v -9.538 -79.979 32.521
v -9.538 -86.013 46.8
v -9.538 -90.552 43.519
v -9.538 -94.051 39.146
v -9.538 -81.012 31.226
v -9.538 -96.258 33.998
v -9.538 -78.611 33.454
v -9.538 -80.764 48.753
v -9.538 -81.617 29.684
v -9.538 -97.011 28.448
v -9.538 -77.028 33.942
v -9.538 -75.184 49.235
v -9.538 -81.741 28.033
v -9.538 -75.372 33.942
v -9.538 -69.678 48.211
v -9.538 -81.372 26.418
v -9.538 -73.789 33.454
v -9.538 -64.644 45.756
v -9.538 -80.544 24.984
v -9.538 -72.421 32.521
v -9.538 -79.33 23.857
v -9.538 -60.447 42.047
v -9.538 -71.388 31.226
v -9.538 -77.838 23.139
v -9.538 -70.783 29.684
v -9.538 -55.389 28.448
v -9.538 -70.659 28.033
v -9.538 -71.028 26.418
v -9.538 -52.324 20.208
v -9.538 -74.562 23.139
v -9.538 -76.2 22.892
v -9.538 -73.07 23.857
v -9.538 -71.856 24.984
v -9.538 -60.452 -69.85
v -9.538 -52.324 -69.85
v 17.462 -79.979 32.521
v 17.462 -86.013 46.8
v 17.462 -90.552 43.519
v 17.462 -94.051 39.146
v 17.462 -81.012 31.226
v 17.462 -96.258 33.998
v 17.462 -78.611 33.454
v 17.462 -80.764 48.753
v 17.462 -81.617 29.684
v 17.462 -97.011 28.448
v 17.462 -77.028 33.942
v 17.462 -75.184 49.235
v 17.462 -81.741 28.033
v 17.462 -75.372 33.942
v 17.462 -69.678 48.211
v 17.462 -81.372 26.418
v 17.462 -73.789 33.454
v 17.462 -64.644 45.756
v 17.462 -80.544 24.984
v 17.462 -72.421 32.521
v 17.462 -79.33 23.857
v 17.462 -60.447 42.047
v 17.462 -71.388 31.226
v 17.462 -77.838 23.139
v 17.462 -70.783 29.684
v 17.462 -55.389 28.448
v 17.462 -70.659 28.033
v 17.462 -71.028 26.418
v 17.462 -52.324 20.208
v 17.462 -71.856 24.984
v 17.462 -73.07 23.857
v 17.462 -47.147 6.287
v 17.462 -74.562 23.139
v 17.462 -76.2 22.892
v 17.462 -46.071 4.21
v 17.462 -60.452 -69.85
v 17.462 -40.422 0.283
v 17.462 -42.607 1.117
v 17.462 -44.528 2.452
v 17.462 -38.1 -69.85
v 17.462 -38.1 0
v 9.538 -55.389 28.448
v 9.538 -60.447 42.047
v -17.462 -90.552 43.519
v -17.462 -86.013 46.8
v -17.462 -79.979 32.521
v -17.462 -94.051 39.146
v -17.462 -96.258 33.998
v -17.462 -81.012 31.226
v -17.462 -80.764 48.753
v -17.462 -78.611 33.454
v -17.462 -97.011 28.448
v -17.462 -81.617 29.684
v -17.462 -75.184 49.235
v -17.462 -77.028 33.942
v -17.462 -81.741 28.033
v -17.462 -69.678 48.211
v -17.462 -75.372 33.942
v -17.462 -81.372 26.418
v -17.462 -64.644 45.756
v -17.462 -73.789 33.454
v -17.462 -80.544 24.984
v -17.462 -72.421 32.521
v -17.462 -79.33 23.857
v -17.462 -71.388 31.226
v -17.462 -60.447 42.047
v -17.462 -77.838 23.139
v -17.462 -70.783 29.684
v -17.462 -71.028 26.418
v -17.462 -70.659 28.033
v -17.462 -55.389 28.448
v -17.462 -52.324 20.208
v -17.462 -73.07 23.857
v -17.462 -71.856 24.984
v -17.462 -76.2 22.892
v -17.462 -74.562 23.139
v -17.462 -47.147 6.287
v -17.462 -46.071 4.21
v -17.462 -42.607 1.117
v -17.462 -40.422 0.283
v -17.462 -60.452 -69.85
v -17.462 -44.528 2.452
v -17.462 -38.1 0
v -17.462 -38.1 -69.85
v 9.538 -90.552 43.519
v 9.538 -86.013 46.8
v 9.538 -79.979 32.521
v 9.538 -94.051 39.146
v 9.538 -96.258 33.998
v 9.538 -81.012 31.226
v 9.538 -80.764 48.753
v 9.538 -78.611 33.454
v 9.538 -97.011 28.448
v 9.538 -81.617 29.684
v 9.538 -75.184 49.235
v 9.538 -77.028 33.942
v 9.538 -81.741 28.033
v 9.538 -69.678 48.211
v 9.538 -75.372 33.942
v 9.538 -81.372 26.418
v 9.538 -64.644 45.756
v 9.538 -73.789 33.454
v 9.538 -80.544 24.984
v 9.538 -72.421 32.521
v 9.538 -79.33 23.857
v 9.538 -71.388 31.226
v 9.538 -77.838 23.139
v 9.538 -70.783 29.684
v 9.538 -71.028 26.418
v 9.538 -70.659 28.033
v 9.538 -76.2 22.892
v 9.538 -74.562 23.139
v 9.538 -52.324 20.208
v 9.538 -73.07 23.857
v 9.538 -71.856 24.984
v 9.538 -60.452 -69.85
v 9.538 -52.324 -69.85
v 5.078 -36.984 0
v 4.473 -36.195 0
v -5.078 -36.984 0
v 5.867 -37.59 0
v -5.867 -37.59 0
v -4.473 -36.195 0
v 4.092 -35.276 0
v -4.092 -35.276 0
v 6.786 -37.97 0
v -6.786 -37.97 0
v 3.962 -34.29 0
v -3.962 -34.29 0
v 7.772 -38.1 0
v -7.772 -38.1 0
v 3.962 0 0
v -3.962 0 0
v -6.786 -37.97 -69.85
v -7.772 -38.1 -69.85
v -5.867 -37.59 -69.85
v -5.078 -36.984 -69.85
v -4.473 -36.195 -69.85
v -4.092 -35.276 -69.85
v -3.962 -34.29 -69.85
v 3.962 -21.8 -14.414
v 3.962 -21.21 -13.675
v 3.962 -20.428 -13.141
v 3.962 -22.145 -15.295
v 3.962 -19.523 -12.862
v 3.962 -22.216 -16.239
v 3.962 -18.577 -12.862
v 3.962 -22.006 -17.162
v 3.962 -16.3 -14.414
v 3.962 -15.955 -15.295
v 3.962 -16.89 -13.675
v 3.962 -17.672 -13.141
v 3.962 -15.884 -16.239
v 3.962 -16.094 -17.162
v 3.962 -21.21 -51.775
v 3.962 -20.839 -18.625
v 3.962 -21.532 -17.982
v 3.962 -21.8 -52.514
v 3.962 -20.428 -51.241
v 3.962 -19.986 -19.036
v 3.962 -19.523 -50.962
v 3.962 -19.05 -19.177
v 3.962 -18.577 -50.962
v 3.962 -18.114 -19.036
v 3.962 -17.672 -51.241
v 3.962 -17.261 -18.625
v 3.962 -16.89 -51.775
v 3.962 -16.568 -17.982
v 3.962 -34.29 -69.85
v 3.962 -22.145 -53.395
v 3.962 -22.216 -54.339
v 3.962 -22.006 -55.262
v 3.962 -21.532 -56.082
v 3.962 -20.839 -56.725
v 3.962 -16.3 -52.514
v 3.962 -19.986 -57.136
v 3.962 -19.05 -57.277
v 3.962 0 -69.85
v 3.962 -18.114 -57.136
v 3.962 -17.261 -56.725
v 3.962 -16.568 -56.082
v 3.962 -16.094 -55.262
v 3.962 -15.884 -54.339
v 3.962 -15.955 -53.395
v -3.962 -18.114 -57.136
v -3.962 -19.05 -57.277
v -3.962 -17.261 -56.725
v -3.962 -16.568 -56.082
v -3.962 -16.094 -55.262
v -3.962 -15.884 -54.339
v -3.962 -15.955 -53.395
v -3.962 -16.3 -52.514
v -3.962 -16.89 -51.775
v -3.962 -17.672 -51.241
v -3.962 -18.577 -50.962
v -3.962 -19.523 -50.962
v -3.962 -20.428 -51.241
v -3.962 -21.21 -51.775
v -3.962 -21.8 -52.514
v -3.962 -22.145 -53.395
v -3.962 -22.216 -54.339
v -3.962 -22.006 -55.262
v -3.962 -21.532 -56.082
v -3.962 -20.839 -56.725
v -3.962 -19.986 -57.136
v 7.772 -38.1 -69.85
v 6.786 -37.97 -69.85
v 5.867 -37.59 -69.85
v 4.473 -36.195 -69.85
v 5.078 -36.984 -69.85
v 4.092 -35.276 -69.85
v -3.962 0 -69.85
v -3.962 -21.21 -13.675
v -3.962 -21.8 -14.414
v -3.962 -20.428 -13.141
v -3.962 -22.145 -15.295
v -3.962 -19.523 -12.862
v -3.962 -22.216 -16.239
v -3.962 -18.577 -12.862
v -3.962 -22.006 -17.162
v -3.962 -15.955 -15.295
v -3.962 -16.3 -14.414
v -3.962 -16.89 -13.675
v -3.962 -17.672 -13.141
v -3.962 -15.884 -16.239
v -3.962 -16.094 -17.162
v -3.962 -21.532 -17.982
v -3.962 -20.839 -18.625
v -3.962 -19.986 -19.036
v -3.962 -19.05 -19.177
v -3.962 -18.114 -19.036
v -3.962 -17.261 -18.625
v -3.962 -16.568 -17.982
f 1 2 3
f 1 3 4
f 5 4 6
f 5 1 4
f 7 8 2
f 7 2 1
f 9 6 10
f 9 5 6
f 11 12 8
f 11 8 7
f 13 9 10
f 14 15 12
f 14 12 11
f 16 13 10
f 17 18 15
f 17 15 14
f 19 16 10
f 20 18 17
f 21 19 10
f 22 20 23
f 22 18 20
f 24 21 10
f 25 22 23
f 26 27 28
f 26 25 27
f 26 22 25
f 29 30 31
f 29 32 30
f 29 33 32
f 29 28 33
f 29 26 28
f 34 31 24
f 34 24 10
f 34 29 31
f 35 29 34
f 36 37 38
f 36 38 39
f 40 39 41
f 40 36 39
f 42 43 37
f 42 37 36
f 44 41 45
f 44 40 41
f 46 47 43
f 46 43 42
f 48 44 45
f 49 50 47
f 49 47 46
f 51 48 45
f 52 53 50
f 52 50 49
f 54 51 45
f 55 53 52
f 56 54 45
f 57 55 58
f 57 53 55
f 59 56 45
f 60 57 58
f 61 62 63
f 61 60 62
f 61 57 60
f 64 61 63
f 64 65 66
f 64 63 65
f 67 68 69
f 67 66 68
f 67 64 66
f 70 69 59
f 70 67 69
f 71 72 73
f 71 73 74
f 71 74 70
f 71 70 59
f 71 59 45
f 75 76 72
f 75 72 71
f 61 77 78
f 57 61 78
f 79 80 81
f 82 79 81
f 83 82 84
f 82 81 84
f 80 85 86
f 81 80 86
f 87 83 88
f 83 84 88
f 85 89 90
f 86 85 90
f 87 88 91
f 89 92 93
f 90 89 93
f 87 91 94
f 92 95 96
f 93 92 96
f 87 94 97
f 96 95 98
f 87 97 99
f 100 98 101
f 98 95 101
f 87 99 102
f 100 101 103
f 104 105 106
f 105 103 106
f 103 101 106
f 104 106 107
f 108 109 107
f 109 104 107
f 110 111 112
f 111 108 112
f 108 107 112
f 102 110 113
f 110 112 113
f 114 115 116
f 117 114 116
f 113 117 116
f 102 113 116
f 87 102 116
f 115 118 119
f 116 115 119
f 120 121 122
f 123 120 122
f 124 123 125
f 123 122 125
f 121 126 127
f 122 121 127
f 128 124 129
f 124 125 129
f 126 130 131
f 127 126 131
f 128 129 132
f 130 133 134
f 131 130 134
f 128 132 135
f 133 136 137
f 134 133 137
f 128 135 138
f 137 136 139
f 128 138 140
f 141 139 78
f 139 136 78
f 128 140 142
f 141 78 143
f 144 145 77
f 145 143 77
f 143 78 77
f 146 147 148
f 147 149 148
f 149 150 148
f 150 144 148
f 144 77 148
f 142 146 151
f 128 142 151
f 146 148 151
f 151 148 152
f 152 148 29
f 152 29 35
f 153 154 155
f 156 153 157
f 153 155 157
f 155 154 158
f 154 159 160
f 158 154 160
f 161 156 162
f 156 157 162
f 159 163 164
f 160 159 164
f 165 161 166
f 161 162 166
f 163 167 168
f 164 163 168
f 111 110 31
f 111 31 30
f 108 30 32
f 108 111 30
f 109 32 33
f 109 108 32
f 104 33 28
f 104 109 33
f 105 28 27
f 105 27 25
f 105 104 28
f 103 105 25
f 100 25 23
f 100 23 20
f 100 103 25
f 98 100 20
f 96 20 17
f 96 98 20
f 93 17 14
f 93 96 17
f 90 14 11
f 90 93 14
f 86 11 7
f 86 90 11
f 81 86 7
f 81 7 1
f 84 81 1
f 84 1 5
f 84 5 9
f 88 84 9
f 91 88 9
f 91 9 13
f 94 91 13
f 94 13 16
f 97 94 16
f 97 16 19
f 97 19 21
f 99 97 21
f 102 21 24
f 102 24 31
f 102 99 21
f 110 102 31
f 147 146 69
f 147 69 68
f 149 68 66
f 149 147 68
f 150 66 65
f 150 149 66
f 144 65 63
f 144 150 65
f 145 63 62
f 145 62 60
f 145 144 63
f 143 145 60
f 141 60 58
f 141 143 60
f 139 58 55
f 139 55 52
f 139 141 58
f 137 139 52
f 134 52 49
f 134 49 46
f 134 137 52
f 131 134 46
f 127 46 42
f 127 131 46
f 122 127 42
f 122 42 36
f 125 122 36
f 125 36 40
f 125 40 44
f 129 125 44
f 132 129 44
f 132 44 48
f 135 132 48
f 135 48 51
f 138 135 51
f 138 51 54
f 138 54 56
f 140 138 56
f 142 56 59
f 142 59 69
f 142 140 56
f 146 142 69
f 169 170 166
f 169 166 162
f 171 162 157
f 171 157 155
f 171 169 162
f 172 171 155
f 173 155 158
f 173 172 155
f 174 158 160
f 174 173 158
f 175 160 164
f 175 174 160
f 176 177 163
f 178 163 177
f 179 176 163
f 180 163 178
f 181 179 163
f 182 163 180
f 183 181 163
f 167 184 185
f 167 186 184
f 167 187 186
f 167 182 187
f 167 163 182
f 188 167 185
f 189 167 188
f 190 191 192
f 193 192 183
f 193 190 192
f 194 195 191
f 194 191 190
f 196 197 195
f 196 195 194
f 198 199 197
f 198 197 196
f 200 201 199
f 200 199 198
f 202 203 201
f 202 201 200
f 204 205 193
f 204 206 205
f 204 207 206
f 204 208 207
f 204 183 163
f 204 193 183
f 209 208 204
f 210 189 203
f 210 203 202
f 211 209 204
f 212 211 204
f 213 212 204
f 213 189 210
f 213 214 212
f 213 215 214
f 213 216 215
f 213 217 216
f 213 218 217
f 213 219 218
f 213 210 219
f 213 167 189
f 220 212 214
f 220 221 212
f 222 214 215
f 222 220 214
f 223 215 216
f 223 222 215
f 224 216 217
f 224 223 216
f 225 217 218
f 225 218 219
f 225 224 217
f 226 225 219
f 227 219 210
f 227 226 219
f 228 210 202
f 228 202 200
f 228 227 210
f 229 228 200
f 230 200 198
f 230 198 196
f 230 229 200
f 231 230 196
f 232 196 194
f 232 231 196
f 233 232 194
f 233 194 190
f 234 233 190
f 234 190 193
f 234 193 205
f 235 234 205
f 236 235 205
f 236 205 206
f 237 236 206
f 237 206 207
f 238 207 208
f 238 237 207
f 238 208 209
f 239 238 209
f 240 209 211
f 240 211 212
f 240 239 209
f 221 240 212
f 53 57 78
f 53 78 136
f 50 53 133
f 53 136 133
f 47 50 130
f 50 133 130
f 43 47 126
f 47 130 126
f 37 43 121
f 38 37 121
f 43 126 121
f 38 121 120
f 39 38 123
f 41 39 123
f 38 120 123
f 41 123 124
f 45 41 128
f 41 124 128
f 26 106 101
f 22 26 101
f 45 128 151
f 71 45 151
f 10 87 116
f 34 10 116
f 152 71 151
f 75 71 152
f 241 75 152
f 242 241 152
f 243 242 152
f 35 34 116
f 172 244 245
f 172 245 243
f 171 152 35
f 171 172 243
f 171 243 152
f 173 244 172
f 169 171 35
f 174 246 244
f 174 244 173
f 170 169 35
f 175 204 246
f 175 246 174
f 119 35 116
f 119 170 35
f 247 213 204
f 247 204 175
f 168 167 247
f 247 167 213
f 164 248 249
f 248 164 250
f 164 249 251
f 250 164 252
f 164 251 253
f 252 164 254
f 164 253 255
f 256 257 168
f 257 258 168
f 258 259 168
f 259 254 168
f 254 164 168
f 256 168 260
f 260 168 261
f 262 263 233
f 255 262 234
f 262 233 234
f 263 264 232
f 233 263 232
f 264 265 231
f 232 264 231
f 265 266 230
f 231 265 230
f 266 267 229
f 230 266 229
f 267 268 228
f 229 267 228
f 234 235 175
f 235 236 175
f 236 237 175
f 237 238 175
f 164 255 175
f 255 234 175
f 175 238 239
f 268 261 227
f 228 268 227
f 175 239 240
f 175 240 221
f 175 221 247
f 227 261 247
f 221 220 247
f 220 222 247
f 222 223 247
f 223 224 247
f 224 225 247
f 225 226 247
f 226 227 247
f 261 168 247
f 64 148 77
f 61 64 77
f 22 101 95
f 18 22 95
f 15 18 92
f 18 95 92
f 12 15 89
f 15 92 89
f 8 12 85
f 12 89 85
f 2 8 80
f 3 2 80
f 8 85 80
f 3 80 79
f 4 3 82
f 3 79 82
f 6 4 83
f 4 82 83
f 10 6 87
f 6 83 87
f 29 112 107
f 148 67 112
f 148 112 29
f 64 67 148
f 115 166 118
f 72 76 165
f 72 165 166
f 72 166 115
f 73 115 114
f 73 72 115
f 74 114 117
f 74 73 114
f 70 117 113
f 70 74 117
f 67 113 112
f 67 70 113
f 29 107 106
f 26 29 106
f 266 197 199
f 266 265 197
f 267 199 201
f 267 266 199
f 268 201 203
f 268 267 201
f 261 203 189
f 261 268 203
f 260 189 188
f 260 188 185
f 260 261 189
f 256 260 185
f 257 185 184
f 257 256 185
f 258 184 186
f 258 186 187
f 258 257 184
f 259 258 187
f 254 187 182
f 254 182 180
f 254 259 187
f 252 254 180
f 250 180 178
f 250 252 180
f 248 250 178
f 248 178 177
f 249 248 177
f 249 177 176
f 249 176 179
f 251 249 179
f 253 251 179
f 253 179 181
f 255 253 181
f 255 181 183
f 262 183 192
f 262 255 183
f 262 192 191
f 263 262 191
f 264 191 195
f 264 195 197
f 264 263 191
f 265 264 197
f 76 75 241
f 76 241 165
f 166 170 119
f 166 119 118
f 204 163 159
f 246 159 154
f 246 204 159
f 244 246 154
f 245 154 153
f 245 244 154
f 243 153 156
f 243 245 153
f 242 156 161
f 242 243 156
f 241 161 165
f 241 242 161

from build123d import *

# Parameters (mm, degrees)
SKETCH1_W           = 69.85
SKETCH1_H           = 38.1
SKETCH1_R           = 3.175
BOSS_EXTRUDE1_DEPTH = 3.9624
BOSS_EXTRUDE2_DEPTH = 17.4625
BOSS_EXTRUDE4_START = 9.5377
SKETCH1_5_R         = 5.55625
BOSS_EXTRUDE4_DEPTH = 7.9248
BOSS_EXTRUDE5_START = -17.4625
SKETCH1_6_R         = 5.55625
BOSS_EXTRUDE5_DEPTH = 7.9248
FILLET1_R           = 3.81


with BuildPart() as part:
    # Sketch1 → Boss-Extrude1 (new, symmetric)
    # profile 1 of 2: a face of its own
    with BuildSketch(Plane(origin=(0, 0, 0), x_dir=(0, 0, -1), z_dir=(1, 0, 0))):
        with Locations((34.925, -19.05)):
            Rectangle(SKETCH1_W, SKETCH1_H)
        with Locations((16.002, -19.05)):
            Circle(SKETCH1_R, mode=Mode.SUBTRACT)
        with Locations((54.102, -19.05)):
            Circle(SKETCH1_R, mode=Mode.SUBTRACT)
    # profile 2 of 2: a face of its own
    with BuildSketch(Plane(origin=(0, 0, 0), x_dir=(0, 0, -1), z_dir=(1, 0, 0))):
        with BuildLine():
            Line((69.85, -38.1), (0, -38.1))
            ThreePointArc((0, -38.1), (-1.726202144, -43.608432839), (-6.287366834, -47.146565517))
            Line((-6.287366834, -47.146565517), (-20.208052372, -52.324))
            Line((-20.208052372, -52.324), (69.85, -52.324))
            Line((69.85, -52.324), (69.85, -38.1))
        make_face()
    extrude(amount=BOSS_EXTRUDE1_DEPTH, both=True)

    # Sketch1<3> → Boss-Extrude2 (add, symmetric)
    with BuildSketch(Plane(origin=(0, 0, 0), x_dir=(0, 0, -1), z_dir=(1, 0, 0))):
        with BuildLine():
            Line((69.85, -38.1), (0, -38.1))
            ThreePointArc((0, -38.1), (-1.726202144, -43.608432839), (-6.287366834, -47.146565517))
            Line((-6.287366834, -47.146565517), (-20.208052372, -52.324))
            Line((-20.208052372, -52.324), (69.85, -52.324))
            Line((69.85, -52.324), (69.85, -38.1))
        make_face()
    extrude(amount=BOSS_EXTRUDE2_DEPTH, both=True)

    # Sketch1<5> → Boss-Extrude4 (add)
    with BuildSketch(Plane(origin=(0, 0, 0), x_dir=(0, 0, -1), z_dir=(1, 0, 0)).offset(BOSS_EXTRUDE4_START)):
        with BuildLine():
            Line((69.85, -60.452), (69.85, -52.324))
            Line((69.85, -52.324), (-20.208052372, -52.324))
            Line((-20.208052372, -52.324), (-28.448, -55.388632763))
            Line((-28.448, -55.388632763), (-42.047327619, -60.446546582))
            ThreePointArc((-42.047327619, -60.446546582), (-47.953946665, -83.454726113), (-28.448, -97.011367237))
            Line((-28.448, -97.011367237), (69.85, -60.452))
        make_face()
        with Locations((-28.448, -76.2)):
            Circle(SKETCH1_5_R, mode=Mode.SUBTRACT)
    extrude(amount=BOSS_EXTRUDE4_DEPTH)

    # Sketch1<6> → Boss-Extrude5 (add)
    with BuildSketch(Plane(origin=(0, 0, 0), x_dir=(0, 0, -1), z_dir=(1, 0, 0)).offset(BOSS_EXTRUDE5_START)):
        with BuildLine():
            Line((69.85, -60.452), (69.85, -52.324))
            Line((69.85, -52.324), (-20.208052372, -52.324))
            Line((-20.208052372, -52.324), (-28.448, -55.388632763))
            Line((-28.448, -55.388632763), (-42.047327619, -60.446546582))
            ThreePointArc((-42.047327619, -60.446546582), (-47.953946665, -83.454726113), (-28.448, -97.011367237))
            Line((-28.448, -97.011367237), (69.85, -60.452))
        make_face()
        with Locations((-28.448, -76.2)):
            Circle(SKETCH1_6_R, mode=Mode.SUBTRACT)
    extrude(amount=BOSS_EXTRUDE5_DEPTH)

    # Fillet1
    # the kernel refuses this fillet: 3.81 mm, written as the material it adds along each edge
    with BuildSketch(Plane(origin=(-3.9624, -38.1, -69.85), x_dir=(-1, 0, 0), z_dir=(0, 0, 1))) as fillet1_piece_1:
        with BuildLine():
            CenterArc((FILLET1_R, -FILLET1_R), FILLET1_R, 90, 90)
            Line((0, -FILLET1_R), (0, 0))
            Line((0, 0), (FILLET1_R, 0))
        make_face()
    extrude(amount=69.85)
    with BuildSketch(Plane(origin=(3.9624, -38.1, -69.85), x_dir=(1, 0, 0), z_dir=(0, 0, 1))) as fillet1_piece_2:
        with BuildLine():
            CenterArc((FILLET1_R, FILLET1_R), FILLET1_R, 180, 90)
            Line((0, FILLET1_R), (0, 0))
            Line((0, 0), (FILLET1_R, 0))
        make_face()
    extrude(amount=69.85)


solid = part.part
